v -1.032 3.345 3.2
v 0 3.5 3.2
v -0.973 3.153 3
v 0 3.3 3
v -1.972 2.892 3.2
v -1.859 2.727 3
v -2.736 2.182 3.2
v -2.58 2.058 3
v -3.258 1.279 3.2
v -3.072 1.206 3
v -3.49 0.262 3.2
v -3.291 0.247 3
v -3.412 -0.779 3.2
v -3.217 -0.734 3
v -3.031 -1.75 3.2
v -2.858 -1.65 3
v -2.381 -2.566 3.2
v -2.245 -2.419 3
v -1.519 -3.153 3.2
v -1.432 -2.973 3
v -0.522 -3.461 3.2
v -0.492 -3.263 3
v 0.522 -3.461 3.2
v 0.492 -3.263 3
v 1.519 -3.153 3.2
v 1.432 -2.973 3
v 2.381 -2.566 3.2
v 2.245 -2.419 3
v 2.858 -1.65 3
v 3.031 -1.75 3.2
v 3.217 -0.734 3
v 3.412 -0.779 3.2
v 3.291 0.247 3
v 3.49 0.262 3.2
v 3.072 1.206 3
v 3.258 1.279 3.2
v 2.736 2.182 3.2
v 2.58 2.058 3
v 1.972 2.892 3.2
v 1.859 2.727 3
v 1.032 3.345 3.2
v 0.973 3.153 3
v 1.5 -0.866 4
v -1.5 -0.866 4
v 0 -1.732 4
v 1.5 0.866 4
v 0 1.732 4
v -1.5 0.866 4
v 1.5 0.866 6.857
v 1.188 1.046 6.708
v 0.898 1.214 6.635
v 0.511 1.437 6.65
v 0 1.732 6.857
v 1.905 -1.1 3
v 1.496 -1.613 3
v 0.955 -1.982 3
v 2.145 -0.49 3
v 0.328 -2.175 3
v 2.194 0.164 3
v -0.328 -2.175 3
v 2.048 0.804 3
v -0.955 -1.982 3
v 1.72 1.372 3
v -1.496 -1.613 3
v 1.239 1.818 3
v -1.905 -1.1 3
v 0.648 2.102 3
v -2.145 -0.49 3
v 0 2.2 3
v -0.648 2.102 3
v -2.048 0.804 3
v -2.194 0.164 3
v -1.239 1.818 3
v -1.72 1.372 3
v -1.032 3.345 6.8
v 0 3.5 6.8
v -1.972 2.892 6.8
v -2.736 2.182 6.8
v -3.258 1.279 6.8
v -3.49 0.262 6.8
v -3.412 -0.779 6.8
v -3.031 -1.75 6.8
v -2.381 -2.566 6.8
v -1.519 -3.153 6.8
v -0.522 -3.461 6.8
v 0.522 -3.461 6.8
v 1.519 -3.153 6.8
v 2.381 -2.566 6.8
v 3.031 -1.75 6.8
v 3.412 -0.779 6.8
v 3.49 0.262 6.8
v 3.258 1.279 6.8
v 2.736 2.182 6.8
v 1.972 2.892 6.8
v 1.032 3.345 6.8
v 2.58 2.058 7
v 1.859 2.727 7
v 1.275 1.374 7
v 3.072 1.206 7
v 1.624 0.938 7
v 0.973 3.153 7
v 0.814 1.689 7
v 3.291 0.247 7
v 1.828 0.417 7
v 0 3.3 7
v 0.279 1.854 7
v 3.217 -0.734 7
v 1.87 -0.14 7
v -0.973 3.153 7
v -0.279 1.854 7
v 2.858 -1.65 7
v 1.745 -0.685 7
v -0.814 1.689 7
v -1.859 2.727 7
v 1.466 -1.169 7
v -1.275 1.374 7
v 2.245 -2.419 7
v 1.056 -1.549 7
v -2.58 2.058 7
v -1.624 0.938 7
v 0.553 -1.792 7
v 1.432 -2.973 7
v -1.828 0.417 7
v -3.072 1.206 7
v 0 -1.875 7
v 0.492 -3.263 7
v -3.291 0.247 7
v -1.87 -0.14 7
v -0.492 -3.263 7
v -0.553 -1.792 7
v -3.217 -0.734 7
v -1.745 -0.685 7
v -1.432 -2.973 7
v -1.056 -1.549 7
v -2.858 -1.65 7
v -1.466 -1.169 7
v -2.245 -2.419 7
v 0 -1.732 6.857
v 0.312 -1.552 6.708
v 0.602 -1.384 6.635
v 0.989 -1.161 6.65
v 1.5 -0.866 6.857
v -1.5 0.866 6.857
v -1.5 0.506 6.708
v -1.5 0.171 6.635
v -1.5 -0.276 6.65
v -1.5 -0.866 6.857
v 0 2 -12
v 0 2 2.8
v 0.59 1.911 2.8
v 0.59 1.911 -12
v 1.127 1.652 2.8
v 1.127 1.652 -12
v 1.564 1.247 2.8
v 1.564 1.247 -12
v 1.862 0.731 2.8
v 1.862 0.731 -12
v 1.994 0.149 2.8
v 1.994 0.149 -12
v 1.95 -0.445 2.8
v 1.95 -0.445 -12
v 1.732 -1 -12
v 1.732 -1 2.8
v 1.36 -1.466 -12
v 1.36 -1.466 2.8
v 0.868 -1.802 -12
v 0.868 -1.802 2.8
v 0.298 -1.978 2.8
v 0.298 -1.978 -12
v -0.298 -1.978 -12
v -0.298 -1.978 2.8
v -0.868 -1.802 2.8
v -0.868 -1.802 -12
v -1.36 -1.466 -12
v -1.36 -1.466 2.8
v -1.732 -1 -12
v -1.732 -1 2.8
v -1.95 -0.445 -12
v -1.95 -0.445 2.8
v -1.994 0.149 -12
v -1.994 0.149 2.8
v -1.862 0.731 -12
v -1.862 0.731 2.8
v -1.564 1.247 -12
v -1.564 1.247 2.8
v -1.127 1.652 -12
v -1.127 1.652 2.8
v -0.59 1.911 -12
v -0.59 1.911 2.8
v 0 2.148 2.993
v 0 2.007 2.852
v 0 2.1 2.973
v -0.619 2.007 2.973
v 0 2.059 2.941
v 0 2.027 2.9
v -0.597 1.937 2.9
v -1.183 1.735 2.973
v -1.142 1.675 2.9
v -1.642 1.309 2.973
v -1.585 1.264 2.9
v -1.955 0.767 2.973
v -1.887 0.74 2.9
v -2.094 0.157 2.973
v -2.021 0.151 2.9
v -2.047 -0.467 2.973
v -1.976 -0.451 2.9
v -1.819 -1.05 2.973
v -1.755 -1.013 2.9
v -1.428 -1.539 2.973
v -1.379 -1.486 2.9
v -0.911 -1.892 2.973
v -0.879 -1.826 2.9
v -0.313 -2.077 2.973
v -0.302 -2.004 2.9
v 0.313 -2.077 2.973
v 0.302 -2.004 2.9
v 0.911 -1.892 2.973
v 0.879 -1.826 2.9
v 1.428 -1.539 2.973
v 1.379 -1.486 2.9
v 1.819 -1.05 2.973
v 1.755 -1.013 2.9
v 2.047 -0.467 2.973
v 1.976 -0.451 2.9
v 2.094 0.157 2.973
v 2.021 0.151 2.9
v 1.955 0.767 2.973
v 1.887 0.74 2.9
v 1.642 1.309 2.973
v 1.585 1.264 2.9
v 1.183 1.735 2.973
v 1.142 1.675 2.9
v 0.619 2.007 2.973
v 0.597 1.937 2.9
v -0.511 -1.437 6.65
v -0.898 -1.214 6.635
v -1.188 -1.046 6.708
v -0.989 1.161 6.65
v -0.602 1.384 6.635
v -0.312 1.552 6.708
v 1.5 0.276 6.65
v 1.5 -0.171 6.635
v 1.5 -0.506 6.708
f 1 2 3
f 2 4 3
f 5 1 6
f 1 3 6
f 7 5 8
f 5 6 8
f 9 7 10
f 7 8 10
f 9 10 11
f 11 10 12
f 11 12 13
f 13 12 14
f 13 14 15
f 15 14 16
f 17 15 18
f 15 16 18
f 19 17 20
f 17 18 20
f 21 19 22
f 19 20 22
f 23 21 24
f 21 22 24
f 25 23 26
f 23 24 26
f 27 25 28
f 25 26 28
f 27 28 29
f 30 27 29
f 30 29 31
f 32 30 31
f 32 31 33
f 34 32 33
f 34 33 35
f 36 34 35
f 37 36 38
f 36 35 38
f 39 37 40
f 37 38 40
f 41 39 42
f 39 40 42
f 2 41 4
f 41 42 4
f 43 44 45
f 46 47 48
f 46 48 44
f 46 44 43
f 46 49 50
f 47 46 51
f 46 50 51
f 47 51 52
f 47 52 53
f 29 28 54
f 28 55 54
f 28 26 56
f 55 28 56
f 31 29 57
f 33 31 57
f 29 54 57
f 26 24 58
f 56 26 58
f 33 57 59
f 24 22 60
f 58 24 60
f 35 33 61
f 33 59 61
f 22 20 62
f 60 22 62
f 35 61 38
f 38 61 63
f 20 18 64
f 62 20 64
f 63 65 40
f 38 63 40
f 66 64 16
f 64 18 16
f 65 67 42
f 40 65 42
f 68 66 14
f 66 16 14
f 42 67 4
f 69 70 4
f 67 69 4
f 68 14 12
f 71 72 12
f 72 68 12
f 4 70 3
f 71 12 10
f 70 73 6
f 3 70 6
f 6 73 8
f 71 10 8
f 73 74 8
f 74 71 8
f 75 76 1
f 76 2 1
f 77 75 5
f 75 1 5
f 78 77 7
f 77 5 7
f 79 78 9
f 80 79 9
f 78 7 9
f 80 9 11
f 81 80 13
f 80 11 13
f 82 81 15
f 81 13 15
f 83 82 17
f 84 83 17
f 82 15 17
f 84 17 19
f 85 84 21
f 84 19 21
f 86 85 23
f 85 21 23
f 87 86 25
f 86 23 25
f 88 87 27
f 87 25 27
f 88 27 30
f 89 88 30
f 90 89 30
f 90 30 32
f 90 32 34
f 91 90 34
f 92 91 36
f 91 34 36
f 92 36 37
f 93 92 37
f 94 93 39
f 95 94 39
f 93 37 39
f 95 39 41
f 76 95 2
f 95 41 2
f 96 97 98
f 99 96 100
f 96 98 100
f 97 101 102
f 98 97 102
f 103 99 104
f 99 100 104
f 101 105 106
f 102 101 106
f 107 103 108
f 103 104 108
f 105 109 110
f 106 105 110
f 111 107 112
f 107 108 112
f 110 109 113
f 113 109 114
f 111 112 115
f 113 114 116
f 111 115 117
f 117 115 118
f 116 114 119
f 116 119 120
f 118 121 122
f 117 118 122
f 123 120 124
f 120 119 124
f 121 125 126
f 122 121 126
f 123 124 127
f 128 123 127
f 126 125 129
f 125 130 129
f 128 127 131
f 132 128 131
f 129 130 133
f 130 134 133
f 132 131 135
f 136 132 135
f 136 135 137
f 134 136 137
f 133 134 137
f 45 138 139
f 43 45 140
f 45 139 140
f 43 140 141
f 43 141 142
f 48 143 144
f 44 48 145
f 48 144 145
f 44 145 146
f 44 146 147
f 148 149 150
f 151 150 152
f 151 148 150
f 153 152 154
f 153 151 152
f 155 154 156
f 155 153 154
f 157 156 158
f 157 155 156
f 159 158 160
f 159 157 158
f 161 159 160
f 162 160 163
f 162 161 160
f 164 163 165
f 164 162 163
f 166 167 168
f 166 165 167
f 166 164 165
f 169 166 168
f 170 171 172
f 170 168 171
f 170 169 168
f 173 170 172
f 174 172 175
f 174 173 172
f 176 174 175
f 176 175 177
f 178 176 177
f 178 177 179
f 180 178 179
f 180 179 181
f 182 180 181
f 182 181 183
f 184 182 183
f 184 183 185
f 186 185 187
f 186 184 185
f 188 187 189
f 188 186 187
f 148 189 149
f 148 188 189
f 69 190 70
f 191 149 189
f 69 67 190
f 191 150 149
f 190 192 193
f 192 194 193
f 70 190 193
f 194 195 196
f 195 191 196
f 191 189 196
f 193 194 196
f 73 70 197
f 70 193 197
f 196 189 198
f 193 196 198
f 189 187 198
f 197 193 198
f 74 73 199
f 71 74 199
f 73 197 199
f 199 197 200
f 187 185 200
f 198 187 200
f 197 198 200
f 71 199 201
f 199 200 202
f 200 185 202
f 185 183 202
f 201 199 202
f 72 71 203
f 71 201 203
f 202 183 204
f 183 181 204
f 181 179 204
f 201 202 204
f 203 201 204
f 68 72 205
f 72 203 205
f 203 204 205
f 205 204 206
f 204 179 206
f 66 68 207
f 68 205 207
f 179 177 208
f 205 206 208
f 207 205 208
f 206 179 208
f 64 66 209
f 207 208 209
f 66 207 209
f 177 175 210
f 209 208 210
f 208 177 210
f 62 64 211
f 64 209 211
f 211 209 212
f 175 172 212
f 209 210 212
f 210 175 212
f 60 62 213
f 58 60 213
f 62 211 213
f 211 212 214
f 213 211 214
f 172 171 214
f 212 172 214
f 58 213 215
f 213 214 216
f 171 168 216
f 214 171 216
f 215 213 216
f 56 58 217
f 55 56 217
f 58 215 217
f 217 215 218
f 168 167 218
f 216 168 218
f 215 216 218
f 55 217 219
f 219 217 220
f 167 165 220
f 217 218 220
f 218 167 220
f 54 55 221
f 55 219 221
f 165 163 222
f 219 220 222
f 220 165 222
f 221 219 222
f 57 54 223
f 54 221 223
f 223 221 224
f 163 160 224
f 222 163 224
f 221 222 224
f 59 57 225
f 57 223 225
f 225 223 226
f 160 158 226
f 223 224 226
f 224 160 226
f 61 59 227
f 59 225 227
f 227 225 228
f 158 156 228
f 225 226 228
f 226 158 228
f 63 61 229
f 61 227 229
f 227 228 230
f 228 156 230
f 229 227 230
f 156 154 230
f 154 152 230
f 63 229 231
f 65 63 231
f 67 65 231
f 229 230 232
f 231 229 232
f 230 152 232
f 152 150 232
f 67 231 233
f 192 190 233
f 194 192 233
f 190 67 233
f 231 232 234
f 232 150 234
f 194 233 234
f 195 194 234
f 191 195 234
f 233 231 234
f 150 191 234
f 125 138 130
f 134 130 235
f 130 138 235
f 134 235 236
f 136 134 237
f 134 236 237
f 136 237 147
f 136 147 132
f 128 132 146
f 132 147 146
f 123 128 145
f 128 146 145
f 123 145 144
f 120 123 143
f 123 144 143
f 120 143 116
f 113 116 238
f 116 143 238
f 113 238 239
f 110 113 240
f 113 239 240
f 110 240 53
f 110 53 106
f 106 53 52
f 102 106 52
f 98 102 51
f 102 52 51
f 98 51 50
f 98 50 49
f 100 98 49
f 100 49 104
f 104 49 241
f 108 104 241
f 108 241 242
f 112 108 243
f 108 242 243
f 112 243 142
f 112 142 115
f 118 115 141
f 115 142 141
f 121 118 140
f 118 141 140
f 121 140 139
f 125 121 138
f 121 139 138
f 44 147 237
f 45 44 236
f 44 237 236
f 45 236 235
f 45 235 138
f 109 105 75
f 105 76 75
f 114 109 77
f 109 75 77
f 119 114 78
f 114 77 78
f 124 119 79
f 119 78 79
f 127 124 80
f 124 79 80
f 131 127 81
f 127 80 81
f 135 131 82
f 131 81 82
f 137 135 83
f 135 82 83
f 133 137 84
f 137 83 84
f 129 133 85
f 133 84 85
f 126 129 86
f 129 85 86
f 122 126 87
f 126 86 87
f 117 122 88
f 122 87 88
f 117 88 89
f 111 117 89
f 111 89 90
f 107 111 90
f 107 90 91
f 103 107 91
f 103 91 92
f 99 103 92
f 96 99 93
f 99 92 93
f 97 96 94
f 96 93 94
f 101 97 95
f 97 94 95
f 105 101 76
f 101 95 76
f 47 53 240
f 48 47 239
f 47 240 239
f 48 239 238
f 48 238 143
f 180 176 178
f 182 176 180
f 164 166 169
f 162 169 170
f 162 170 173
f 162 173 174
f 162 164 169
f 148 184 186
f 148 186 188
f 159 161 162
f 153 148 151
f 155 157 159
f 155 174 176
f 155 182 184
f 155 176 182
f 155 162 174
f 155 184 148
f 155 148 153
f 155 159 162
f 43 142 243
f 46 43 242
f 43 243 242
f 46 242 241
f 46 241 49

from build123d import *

# Parameters (mm, degrees)
CUT_EXTRUDE1_DEPTH  = 3
BOSS_EXTRUDE1_START = 15
SKETCH12_R          = 2
BOSS_EXTRUDE1_DEPTH = 15


with BuildPart() as part:
    # Sketch2 → Revolve1 (revolve)
    with BuildSketch(Plane(origin=(0, 0, 0), x_dir=(0, 0, -1), z_dir=(1, 0, 0))):
        with BuildLine():
            Line((-7, 0), (-7, 3.3))
            Line((-7, 3.3), (-6.8, 3.5))
            Line((-6.8, 3.5), (-3.2, 3.5))
            Line((-3.2, 3.5), (-3, 3.3))
            Line((-3, 3.3), (-3, 2.2))
            ThreePointArc((-3, 2.2), (-2.941421356, 2.058578644), (-2.8, 2))
            Line((-2.8, 2), (6.545336663, 2))
            Line((6.545336663, 2), (7, 1.545336663))
            Line((7, 1.545336663), (7, 0))
            Line((7, 0), (-7, 0))
        make_face()
    revolve(axis=Axis((0, 0, -7), (0, 0, 1)))

    # Sketch3 → Cut-Extrude1 (cut)
    with BuildSketch(Plane.XY.offset(7)):
        Polygon((1.5, -0.866025404), (1.5, 0.866025404), (0, 1.732050808), (-1.5, 0.866025404), (-1.5, -0.866025404), (0, -1.732050808), align=None)
    extrude(amount=-CUT_EXTRUDE1_DEPTH, mode=Mode.SUBTRACT)

    # Cut-Extrude2 cone 1 section (through the dimple's axis) → Cut-Extrude2 (revolve, cut)
    with BuildSketch(Plane(origin=(0, 0, 7), x_dir=(0, -1, 0), z_dir=(1, 0, 0))):
        Polygon((0, 0), (1.875, 0), (0, 1.875), align=None)
    revolve(axis=Axis((0, 0, 7), (0, 0, -1)), mode=Mode.SUBTRACT)

    # Sketch12 → Boss-Extrude1 (add)
    with BuildSketch(Plane(origin=(0, 0, 3), x_dir=(-1, 0, 0), z_dir=(0, 0, -1)).offset(BOSS_EXTRUDE1_START)):
        with Locations(Location((0, 0, 0), (0, 0, 90))):
            Circle(SKETCH12_R)
    extrude(amount=-BOSS_EXTRUDE1_DEPTH)


solid = part.part
